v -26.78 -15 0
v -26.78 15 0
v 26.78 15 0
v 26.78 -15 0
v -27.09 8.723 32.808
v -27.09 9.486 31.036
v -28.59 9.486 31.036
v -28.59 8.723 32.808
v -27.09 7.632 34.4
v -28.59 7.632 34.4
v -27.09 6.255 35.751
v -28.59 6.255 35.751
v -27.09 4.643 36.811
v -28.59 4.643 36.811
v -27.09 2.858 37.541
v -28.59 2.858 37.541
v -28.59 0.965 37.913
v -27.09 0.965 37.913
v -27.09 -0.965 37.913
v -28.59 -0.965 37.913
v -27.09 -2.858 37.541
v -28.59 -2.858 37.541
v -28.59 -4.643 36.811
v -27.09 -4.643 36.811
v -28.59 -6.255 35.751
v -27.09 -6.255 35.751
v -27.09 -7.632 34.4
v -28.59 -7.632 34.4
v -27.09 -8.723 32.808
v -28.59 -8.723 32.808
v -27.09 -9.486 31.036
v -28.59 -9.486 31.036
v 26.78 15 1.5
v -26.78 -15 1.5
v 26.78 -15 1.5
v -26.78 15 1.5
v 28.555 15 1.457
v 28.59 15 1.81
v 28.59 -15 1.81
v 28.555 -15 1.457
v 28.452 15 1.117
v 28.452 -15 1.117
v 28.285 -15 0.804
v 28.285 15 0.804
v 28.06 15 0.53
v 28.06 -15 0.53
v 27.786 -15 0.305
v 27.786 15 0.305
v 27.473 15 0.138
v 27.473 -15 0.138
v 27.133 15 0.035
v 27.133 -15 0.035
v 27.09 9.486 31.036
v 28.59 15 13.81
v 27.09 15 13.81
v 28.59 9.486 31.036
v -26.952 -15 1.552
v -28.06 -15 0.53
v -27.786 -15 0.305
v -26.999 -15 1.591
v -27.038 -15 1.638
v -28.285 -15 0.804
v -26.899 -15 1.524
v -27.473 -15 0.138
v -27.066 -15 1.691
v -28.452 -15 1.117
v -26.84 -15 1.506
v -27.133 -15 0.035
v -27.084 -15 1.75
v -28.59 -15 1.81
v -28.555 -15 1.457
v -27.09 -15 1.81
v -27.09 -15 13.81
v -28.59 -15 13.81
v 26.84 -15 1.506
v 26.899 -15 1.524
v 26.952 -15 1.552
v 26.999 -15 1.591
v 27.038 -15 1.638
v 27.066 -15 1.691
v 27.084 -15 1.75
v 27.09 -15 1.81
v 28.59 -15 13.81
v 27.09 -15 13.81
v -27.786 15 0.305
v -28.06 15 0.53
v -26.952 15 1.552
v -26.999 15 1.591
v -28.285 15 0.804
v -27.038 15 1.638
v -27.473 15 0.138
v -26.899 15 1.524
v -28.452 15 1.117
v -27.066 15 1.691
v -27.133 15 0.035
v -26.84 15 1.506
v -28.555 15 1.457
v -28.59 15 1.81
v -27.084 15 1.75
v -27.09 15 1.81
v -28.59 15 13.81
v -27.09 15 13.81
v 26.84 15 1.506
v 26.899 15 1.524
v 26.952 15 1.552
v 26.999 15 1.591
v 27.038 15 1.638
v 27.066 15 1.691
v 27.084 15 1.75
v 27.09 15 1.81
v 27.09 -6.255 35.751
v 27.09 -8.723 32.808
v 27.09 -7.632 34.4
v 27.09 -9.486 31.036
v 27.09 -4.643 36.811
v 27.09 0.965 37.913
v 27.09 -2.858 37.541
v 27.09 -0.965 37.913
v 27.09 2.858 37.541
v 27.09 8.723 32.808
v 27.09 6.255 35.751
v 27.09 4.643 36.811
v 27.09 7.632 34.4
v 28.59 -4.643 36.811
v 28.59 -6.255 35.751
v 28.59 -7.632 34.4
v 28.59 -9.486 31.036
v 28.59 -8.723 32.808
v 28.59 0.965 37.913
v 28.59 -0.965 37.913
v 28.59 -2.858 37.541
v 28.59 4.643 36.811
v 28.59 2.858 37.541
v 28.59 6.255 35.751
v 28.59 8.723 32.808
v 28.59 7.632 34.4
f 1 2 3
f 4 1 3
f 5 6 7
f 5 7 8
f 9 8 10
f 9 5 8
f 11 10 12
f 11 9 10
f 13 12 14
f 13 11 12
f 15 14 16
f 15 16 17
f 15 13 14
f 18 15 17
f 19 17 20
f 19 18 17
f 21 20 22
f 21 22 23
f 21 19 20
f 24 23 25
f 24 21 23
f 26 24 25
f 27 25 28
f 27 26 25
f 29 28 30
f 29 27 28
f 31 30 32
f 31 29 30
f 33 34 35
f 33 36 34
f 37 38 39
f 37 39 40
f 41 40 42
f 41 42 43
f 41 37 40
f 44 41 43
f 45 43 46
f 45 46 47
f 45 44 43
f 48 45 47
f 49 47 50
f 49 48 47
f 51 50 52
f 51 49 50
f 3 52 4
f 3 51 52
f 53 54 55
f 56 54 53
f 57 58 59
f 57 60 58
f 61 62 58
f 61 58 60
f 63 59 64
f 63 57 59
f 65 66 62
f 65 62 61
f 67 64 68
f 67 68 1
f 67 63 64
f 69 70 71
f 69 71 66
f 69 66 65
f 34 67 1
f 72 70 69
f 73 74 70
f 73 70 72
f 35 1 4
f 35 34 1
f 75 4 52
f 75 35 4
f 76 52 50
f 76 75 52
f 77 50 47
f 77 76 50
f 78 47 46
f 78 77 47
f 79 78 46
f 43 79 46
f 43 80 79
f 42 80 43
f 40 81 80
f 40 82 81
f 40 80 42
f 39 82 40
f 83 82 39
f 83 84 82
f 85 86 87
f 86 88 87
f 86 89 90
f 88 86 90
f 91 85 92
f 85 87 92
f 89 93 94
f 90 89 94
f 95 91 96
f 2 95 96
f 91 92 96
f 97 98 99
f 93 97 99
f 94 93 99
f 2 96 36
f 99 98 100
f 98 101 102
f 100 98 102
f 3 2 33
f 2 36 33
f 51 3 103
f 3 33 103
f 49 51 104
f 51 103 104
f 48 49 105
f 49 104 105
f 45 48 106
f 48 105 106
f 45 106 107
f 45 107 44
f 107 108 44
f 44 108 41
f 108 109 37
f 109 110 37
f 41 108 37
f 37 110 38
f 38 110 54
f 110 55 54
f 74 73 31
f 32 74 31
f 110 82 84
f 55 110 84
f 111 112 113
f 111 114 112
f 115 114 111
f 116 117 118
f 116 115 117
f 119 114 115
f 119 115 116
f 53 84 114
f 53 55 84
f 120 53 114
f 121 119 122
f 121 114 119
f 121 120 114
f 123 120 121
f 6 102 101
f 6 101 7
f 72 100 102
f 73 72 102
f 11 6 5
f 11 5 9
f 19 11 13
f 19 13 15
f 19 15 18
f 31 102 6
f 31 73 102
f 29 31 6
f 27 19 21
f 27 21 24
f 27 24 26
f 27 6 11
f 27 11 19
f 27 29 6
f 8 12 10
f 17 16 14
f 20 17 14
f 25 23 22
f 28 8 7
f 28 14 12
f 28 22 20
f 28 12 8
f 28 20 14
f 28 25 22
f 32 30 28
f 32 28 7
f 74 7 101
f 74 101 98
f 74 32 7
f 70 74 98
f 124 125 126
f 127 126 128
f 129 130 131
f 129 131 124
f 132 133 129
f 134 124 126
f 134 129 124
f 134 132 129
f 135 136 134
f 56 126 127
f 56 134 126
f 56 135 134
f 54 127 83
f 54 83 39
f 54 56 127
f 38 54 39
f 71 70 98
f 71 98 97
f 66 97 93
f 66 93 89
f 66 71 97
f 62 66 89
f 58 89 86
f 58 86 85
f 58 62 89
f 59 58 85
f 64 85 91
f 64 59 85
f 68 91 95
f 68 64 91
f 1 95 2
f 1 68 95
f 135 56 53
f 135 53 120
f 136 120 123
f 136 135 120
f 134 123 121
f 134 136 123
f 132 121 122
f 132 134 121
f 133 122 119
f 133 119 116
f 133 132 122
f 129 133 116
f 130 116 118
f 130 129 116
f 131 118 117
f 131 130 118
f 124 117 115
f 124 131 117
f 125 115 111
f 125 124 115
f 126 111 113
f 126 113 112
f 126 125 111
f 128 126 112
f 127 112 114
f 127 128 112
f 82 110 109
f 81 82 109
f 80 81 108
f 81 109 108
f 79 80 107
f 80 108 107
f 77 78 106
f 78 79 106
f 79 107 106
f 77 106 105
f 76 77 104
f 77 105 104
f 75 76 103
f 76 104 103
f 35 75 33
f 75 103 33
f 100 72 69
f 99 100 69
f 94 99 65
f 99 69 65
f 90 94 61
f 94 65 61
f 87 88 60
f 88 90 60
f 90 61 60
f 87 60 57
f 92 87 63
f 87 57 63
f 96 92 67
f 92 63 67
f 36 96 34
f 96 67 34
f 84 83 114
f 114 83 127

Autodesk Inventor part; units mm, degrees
ref_plane "YZ Plane" through (0, 0, 0) normal (1, 0, 0) x (0, 1, 0)
ref_plane "XZ Plane" through (0, 0, 0) normal (0, 1, 0) x (-1, 0, 0)
ref_plane "XY Plane" through (0, 0, 0) normal (0, 0, 1) x (1, 0, 0)
sketch "Sketch1" plane through (0, 0, 0) normal (0, 0, 1) x (1, 0, 0)
  line L0 (-28.59, -15) -> (28.59, -15)
  line L1 (28.59, -15) -> (28.59, 15)
  line L2 (28.59, 15) -> (-28.59, 15)
  line L3 (-28.59, 15) -> (-28.59, -15)
  line L4 (-28.59, -15) -> (28.59, 15) construction
  line L5 (28.59, -15) -> (-28.59, 15) construction
  point P0 (0, 0)
  dimension "d0" = 57.18
  dimension "d1" = 30
extrude "Plate1" add sketch "Sketch1" along normal blind 1.5
sketch "Sketch2" plane through (-27.09, -15, 0) normal (-1, 0, 0) x (0, -1, 0)
  line L0 (-30, 0) -> (0, 0)
  line L1 (0, 0) -> (0, 45)
  line L2 (0, 45) -> (-30, 45)
  line L3 (-30, 45) -> (-30, 0)
edge flange "Flange1" height 45 angle 90 thickness 1.5 bend radius 0.31 thickness toward (-1, 0, 0) relief tear relief width 1.5 relief depth 0.75 corner gap 0.31 corner form 0 edges at (-28.59, 0, 1.5) (28.59, 0, 1.5) wall of the first edge with corners at (-27.09, 15, 0) (-27.09, -15, 0) (-27.09, -15, 45) (-27.09, 15, 45)
bend "Bend1"
corner "Corner1"
sketch "Sketch3" plane through (28.59, -15, 45) normal (1, 0, 0) x (0, 0, -1)
  circle A0 centre (17, 15) radius 9.96
  line L0 (0, 30) -> (43.19, 30) projected
  line L1 (43.19, 0) -> (0, 0) projected
  line L2 (31.19, 30) -> (13.9636, 24.4859)
  line L3 (31.19, 0) -> (13.9636, 5.5141)
  line L4 (0, 30) -> (0, 0)
  point P0 (45, 15)
  dimension "d13" = 19.92
  dimension "d14" = 12
  dimension "d15" = 28
extrude "Cut1" cut sketch "Sketch3" against normal blind 57.18 contours A0 L3 L1 L4 L0 L2
equation "\"d2\" = Thickness"
equation "\"d3\" = BendReliefWidth"
equation "\"d4\" = BendReliefDepth"
equation "\"d5\" = MinimumRemnant"
equation "\"d6\" = TransitionRadius"
equation "\"d9\" = BendRadius"
equation "\"d10\" = CornerReliefSize"
equation "\"d11\" = GapSize"
equation "\"d12\" = JacobiRadiusSize"
equation "\"BendReliefWidth\" = Thickness"
equation "\"BendReliefDepth\" = 0.5 * Thickness"
equation "\"CornerReliefSize\" = 4 * Thickness"
equation "\"MinimumRemnant\" = 2 * Thickness"
equation "\"TransitionRadius\" = BendRadius"
equation "\"JacobiRadiusSize\" = BendRadius"
equation "\"GapSize\" = Thickness"
equation "\"Thickness\" = 1.5"
equation "\"BendRadius\" = 0.31"
properties part number "axis_21_bottom_frame" material "Aluminum 6061-AHC"
